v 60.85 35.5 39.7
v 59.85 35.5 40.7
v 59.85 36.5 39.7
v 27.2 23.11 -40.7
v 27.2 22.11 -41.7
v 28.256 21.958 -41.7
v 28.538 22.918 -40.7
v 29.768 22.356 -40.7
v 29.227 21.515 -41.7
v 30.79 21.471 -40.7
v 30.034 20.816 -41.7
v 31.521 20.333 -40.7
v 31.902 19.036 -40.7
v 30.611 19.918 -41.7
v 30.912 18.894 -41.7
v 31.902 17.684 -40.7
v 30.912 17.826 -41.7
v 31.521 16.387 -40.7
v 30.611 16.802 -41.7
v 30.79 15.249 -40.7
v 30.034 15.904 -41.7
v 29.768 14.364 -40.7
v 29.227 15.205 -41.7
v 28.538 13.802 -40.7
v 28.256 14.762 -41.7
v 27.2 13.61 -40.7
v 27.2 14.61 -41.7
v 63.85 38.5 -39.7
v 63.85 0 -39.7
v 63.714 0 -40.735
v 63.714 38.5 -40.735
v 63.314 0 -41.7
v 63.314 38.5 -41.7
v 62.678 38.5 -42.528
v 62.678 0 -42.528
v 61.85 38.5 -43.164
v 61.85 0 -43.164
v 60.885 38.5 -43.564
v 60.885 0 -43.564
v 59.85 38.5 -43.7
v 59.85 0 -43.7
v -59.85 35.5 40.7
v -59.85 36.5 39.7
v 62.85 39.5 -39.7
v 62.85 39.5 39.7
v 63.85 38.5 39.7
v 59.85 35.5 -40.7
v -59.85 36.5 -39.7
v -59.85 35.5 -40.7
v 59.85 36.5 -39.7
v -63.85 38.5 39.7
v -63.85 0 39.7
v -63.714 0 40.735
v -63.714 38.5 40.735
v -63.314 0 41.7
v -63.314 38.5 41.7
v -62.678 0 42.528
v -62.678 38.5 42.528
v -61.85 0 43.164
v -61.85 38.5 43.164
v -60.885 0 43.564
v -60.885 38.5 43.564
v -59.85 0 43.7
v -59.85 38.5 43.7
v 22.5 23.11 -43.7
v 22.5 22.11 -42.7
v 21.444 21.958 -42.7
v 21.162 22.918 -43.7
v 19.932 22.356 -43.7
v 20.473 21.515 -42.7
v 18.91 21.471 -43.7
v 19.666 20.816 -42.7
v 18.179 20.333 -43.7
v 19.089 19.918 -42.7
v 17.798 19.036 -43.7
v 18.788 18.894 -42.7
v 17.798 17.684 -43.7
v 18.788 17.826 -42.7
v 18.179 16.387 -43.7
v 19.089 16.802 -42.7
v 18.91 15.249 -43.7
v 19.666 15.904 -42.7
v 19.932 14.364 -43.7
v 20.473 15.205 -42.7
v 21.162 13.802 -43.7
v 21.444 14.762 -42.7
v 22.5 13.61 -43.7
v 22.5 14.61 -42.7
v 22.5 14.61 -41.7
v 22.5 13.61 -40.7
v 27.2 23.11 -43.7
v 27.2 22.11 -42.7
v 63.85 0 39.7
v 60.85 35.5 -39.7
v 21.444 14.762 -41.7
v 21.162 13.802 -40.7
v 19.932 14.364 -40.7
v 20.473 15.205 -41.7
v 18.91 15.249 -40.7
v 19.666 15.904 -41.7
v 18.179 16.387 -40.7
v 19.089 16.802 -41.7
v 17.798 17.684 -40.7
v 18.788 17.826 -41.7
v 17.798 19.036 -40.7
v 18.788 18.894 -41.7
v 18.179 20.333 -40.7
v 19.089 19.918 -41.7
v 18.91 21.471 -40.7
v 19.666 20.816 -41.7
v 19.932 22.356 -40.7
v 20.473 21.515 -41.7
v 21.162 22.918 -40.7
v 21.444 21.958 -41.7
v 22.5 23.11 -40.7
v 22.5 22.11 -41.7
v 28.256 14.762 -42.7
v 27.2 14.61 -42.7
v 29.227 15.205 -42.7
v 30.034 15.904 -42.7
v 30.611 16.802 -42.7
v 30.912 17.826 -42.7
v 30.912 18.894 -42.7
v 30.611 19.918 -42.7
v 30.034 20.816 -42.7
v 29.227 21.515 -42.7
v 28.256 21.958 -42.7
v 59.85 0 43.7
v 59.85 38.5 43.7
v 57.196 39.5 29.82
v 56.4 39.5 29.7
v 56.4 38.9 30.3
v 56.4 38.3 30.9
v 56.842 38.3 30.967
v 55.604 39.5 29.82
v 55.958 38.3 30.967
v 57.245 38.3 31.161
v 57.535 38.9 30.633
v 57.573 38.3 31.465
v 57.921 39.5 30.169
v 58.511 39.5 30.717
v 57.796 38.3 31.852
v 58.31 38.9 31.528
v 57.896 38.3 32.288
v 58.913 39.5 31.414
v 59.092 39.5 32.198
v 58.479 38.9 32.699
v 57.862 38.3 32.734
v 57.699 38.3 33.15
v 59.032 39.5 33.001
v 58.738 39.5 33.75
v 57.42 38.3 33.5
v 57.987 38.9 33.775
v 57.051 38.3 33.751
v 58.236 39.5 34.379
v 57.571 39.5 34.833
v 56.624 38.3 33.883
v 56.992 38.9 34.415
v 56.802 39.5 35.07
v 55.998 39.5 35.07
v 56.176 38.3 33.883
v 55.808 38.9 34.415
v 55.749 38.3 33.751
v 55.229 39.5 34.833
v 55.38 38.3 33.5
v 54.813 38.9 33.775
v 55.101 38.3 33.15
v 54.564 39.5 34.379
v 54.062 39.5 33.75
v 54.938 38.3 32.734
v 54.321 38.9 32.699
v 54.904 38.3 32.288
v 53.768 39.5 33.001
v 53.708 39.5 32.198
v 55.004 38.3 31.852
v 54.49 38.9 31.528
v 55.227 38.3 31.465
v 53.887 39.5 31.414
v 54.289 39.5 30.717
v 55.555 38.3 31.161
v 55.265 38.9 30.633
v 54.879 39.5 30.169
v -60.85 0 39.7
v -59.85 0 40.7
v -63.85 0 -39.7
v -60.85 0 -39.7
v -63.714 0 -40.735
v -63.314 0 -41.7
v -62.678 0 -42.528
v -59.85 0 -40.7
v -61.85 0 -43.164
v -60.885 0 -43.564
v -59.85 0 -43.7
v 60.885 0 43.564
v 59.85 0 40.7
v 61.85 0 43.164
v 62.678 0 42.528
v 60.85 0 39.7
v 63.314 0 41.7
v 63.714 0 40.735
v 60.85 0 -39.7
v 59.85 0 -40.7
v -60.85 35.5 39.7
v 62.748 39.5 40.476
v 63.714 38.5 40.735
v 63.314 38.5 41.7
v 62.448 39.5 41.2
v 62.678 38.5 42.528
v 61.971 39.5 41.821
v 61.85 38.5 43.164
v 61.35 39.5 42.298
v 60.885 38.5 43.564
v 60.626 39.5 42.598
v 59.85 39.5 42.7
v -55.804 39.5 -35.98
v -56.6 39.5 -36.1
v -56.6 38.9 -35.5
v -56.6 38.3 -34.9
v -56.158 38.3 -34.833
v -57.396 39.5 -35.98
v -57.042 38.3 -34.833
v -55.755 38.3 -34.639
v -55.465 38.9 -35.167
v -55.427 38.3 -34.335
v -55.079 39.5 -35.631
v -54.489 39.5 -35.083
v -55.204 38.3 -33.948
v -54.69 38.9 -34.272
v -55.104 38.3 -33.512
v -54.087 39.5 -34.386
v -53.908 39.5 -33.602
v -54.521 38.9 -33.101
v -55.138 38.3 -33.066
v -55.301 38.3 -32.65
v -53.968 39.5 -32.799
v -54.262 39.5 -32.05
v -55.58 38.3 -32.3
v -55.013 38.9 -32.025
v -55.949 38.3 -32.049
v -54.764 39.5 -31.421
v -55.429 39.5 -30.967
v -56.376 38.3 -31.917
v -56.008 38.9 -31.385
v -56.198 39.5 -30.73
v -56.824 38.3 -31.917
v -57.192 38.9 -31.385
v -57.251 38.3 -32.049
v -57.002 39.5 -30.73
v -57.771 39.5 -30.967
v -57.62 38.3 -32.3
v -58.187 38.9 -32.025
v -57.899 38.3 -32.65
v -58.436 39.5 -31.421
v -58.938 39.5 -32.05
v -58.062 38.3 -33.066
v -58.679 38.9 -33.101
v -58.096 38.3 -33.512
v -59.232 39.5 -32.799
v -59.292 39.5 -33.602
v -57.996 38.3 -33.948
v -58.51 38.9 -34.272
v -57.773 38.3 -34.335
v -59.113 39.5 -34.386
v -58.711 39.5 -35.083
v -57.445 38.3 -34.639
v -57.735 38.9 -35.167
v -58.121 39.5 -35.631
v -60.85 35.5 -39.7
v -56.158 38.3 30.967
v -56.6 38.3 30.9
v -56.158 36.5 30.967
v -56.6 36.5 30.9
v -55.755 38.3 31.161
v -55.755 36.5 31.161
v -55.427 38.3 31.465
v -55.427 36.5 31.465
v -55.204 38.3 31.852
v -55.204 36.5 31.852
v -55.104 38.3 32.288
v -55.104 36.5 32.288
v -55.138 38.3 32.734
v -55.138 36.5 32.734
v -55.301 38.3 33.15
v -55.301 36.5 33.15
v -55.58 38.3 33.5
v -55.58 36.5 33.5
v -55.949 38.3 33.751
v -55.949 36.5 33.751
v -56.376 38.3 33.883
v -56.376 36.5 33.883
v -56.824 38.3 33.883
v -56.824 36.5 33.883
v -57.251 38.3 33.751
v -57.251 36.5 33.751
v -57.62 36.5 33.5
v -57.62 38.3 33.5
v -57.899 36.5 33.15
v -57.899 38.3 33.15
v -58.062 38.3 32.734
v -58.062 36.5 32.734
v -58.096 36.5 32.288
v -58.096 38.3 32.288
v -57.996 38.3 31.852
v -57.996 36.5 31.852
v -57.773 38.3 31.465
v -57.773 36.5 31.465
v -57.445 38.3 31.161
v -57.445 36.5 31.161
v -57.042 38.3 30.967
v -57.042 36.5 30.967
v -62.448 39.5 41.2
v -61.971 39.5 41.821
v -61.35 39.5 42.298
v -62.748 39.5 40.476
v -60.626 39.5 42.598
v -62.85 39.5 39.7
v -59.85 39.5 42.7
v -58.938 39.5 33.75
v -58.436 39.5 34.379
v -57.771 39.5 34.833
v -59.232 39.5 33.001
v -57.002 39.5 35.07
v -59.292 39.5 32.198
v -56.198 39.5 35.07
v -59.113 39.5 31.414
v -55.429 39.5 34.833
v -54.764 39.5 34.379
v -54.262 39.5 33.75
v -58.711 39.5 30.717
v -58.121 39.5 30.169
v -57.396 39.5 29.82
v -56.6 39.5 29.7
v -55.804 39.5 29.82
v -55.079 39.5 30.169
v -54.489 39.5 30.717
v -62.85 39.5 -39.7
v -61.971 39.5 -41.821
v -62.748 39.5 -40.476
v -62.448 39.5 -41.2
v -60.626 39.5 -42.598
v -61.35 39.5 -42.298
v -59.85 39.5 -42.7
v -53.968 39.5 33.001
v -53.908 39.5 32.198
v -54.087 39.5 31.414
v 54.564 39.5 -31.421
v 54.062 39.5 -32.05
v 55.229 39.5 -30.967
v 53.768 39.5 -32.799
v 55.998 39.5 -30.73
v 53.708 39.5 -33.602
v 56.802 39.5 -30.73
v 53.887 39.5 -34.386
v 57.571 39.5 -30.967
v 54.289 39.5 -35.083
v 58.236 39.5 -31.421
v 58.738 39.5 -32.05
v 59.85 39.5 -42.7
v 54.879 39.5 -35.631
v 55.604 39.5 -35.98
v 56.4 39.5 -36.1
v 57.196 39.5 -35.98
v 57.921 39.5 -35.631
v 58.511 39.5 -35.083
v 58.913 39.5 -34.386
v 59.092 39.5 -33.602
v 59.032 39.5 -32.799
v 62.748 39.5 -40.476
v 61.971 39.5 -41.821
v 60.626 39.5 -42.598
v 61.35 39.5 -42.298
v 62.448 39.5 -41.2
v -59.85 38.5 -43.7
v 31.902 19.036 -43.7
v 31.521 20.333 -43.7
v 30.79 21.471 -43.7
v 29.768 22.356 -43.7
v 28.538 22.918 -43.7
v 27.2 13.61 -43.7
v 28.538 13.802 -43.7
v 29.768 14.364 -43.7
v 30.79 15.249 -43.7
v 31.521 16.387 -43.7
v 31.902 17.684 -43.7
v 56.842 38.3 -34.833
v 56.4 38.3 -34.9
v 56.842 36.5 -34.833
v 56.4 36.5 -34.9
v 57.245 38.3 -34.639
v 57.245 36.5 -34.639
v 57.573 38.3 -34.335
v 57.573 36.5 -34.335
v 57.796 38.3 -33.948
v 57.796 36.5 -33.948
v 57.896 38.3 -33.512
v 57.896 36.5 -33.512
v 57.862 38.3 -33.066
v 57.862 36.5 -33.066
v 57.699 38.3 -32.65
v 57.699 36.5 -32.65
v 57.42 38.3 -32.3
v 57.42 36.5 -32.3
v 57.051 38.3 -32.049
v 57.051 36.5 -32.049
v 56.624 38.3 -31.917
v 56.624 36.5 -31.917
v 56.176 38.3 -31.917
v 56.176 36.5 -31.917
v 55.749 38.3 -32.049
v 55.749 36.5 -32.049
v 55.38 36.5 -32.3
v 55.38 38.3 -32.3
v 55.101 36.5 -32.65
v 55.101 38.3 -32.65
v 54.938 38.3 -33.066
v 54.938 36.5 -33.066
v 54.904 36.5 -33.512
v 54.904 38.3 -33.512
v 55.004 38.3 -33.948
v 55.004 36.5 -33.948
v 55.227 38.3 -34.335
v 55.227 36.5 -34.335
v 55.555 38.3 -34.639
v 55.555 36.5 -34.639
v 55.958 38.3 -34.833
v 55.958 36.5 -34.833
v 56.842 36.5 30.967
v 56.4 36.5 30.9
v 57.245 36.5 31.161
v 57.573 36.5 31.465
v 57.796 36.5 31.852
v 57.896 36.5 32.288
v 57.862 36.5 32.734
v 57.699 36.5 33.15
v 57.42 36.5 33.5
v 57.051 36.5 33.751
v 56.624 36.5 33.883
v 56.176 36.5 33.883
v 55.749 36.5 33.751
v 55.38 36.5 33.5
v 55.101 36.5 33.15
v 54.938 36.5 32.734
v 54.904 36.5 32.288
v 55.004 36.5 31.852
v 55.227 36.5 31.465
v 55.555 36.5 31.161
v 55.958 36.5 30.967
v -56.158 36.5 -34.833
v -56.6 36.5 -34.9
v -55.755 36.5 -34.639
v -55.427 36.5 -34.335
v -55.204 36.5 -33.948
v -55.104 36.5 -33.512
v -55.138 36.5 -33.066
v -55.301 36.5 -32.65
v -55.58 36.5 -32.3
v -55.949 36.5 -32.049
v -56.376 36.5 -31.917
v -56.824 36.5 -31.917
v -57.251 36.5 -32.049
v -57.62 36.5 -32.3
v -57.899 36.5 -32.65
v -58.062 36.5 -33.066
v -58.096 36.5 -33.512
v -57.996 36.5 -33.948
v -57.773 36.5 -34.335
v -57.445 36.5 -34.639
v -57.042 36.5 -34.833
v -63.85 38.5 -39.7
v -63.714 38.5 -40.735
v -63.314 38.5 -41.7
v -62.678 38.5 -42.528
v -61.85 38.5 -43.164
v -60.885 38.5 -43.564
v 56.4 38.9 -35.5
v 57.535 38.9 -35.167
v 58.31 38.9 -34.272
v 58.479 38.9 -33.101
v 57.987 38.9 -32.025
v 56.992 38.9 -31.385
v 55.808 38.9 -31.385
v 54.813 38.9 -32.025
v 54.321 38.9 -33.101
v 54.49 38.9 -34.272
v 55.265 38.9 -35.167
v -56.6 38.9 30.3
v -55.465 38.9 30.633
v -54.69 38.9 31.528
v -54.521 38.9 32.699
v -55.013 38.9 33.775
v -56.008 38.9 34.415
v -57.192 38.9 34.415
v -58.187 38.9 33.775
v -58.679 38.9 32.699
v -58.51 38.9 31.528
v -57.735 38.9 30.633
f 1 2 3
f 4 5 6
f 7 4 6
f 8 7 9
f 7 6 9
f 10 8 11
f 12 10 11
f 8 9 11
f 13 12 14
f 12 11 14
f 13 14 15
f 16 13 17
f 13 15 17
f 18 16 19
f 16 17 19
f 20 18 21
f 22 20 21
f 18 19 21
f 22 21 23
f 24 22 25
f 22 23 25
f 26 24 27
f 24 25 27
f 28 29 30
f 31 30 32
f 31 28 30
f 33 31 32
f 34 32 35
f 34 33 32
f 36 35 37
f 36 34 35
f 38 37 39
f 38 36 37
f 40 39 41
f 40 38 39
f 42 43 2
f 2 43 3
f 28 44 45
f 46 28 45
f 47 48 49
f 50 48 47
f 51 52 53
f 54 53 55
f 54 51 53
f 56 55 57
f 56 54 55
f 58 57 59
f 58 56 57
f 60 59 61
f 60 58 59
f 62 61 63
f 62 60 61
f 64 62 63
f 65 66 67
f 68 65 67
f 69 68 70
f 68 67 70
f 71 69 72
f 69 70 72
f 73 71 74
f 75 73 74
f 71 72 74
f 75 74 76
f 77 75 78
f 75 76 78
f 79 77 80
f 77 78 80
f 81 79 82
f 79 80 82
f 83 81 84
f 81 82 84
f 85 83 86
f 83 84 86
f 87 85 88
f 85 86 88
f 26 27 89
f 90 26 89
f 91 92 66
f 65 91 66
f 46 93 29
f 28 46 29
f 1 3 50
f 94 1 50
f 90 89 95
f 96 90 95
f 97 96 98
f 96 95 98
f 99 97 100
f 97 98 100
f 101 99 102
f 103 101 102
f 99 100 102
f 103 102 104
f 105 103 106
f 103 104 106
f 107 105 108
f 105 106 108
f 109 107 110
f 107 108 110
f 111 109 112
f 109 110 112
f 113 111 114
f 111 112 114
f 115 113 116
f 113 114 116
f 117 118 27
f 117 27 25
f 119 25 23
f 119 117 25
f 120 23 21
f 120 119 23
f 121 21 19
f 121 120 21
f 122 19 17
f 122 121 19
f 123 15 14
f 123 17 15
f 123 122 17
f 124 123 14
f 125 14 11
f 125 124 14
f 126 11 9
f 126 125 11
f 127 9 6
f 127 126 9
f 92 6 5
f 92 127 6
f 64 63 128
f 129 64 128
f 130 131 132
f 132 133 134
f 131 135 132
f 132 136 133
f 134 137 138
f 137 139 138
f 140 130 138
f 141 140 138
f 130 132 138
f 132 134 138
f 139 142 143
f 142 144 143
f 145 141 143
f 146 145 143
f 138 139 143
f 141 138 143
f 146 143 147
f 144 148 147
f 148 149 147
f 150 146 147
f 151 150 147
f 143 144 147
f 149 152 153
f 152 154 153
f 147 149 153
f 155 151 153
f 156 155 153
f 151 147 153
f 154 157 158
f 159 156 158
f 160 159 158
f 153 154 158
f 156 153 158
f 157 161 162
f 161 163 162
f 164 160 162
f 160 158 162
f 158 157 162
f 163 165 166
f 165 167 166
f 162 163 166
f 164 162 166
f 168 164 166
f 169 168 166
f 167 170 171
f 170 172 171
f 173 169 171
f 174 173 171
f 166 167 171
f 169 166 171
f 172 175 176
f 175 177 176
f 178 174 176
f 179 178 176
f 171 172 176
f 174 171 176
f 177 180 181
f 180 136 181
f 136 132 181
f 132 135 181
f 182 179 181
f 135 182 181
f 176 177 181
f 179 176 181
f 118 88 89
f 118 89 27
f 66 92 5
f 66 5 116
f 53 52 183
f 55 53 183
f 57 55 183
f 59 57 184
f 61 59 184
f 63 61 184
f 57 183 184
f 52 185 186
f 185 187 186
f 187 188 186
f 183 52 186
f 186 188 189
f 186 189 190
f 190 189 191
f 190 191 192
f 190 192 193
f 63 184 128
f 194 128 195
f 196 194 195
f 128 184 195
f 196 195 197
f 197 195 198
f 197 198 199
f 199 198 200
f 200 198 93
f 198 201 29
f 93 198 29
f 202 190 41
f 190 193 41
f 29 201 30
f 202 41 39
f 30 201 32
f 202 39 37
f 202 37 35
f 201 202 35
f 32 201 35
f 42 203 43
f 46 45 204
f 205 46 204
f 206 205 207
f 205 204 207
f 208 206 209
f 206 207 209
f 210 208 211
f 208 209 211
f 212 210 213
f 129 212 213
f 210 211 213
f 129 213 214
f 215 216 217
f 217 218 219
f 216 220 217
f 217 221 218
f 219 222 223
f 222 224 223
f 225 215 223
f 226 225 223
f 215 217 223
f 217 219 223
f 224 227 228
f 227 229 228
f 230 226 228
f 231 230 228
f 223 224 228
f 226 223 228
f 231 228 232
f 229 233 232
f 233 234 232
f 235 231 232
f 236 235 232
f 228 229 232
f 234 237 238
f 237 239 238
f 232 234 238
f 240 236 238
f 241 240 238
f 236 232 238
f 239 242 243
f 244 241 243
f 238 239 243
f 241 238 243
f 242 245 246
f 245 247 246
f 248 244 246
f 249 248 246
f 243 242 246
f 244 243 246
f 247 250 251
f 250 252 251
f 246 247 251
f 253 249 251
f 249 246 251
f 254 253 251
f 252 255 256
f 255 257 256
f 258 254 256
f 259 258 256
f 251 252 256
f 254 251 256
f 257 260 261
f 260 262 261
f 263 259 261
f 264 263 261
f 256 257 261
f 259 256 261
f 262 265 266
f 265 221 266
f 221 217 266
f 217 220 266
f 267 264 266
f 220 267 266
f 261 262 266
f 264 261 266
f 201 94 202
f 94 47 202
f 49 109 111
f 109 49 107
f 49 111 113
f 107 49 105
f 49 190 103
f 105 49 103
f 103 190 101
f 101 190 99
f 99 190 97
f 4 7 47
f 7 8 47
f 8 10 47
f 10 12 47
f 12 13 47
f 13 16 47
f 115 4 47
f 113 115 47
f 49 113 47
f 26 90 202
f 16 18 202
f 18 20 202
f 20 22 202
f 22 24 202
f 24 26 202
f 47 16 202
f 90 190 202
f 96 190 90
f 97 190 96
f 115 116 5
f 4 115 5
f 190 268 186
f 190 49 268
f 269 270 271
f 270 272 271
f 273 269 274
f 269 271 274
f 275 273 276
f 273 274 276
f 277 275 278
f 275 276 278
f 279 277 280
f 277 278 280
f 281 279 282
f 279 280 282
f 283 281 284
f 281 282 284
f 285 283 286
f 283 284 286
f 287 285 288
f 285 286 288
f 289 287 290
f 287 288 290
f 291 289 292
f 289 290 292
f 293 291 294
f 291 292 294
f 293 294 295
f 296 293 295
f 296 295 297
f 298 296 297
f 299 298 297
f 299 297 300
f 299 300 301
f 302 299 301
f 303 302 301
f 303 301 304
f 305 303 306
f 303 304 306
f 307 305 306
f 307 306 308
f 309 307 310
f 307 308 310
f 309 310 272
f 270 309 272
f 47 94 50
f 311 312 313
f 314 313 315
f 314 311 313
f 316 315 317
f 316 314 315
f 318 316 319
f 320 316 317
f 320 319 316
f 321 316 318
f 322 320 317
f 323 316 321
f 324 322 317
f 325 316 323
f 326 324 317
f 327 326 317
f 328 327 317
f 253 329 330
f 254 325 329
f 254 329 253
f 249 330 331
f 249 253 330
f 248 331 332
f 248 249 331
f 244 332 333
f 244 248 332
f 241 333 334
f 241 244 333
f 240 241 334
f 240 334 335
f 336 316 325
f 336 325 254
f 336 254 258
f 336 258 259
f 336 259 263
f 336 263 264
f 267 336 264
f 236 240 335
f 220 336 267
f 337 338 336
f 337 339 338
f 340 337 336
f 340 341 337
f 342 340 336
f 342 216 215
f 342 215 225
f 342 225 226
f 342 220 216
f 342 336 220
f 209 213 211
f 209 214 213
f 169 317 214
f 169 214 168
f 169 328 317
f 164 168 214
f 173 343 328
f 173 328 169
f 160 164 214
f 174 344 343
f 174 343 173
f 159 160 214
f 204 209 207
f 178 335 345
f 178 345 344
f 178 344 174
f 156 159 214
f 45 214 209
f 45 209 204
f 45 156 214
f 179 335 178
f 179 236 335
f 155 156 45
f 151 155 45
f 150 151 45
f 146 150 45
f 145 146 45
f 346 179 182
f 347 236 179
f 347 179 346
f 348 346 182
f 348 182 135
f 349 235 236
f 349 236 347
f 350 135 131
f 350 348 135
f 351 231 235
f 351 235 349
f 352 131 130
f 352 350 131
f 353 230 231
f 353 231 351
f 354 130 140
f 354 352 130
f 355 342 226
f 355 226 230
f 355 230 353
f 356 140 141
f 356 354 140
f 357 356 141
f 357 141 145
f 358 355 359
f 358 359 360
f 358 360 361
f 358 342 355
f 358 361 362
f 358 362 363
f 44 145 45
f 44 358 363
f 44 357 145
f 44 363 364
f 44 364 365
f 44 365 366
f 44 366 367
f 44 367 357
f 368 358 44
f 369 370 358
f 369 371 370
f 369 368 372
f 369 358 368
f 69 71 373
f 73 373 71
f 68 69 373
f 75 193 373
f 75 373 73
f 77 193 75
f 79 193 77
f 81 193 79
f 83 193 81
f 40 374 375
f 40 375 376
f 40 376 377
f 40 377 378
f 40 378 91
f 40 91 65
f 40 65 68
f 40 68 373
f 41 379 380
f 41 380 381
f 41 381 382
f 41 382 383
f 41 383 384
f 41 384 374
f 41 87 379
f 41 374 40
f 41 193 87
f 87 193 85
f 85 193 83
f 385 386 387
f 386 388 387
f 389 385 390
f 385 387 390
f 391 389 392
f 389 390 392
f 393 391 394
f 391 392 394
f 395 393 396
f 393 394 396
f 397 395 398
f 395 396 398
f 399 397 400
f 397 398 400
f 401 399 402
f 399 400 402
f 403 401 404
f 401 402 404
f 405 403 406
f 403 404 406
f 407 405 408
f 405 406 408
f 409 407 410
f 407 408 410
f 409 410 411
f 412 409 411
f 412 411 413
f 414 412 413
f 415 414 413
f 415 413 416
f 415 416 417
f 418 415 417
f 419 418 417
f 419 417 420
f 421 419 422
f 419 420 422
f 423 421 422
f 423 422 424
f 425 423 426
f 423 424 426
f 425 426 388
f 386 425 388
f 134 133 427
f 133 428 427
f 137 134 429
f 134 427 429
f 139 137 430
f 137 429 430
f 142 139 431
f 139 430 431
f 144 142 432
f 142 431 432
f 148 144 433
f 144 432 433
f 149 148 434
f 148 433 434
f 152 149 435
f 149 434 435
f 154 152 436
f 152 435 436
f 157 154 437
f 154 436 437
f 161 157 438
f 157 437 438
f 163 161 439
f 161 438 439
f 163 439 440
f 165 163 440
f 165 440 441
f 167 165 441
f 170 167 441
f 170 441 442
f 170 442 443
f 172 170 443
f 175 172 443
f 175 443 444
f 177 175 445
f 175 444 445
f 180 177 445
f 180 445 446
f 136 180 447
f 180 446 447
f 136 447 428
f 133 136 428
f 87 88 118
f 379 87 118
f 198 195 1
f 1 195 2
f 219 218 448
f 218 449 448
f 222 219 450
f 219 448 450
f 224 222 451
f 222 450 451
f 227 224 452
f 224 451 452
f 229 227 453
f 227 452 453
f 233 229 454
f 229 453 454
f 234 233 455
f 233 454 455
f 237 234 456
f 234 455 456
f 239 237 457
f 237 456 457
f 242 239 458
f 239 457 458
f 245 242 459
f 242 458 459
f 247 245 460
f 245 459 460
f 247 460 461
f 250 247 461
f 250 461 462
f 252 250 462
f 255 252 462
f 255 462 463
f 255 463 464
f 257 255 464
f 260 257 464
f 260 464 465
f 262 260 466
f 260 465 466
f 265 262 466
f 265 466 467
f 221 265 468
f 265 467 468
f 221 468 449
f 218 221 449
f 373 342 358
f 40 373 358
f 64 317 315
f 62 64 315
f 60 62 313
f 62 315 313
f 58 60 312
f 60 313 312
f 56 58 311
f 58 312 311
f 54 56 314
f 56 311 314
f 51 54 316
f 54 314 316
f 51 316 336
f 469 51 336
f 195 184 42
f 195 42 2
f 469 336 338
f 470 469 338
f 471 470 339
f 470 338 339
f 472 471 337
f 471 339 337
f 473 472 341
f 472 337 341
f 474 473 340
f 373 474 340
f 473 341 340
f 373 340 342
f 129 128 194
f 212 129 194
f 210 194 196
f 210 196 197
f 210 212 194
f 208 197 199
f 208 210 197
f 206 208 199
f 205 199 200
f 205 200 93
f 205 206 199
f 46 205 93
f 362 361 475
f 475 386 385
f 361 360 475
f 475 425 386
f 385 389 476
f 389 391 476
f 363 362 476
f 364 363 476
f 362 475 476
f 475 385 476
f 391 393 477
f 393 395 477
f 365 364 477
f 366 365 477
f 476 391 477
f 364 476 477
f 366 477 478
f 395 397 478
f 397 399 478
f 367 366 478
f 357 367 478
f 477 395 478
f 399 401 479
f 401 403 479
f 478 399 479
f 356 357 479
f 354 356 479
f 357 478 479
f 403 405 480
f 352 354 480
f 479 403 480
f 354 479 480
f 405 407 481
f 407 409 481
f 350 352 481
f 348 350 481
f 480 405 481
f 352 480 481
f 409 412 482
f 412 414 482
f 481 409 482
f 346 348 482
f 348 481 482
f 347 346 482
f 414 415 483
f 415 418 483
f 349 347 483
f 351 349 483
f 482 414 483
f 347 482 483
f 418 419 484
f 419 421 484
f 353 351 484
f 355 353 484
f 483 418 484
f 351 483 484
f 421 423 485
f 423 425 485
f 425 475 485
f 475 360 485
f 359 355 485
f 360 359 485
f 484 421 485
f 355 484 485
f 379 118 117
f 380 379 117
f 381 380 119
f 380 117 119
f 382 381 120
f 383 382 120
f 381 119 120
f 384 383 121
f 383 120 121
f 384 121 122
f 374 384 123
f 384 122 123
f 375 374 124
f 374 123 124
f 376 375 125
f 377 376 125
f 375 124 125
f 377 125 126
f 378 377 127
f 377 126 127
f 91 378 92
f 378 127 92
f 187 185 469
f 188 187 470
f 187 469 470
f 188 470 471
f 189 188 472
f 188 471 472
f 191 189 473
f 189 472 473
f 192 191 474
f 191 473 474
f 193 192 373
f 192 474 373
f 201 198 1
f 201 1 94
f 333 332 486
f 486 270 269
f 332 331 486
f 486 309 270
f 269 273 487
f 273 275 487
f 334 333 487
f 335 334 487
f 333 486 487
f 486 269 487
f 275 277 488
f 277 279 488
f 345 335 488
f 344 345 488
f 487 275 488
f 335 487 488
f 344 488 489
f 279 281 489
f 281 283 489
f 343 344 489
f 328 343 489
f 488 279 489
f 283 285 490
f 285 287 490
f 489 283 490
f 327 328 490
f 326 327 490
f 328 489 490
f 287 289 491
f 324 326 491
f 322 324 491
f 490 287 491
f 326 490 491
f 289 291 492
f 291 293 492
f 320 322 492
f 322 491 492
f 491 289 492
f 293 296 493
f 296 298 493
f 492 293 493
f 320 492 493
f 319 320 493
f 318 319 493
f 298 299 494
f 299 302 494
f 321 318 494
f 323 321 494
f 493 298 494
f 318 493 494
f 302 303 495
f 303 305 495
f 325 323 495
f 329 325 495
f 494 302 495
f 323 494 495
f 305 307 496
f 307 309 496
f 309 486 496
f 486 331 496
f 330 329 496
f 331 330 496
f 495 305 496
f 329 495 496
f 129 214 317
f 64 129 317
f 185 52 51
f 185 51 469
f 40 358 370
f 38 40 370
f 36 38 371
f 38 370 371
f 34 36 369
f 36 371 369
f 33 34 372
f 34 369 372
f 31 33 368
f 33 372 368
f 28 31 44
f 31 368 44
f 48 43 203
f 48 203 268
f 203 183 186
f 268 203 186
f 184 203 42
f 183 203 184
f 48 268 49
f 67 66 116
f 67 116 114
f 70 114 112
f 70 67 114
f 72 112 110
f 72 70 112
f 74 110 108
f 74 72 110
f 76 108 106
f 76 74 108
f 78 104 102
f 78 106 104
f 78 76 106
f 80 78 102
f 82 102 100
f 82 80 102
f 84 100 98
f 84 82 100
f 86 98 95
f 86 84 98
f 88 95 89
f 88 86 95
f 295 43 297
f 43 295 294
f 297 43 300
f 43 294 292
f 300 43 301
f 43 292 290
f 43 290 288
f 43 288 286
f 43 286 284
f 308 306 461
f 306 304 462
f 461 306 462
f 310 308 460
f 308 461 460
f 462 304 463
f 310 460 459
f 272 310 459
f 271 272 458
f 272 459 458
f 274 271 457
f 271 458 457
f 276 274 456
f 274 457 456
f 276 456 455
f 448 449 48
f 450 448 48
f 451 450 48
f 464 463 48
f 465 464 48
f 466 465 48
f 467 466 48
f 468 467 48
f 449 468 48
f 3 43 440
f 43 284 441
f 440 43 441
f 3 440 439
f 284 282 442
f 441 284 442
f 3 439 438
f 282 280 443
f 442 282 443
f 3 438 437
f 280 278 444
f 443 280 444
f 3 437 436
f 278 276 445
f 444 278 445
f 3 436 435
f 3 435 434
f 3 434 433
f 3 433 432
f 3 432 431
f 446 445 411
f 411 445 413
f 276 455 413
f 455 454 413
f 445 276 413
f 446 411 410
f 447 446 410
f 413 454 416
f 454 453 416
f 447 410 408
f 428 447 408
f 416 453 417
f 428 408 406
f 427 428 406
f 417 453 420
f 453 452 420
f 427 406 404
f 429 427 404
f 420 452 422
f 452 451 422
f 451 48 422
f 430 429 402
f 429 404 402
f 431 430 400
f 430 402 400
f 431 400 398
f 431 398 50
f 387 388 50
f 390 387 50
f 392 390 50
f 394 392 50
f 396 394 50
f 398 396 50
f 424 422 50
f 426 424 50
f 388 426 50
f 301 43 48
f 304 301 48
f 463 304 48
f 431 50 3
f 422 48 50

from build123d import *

# Parameters (mm, degrees)
SKETCH1_W                                       = 127.7
SKETCH1_H                                       = 87.4
BOSS_EXTRUDE1_DEPTH                             = 39.5
SHELL1_T                                        = -3
FILLET2_R                                       = 4
CSK_FOR_M2_FLAT_HEAD_MACHINE_SCREW3_D           = 3
CSK_FOR_M2_FLAT_HEAD_MACHINE_SCREW3_CSINK_D     = 5.4
CSK_FOR_M2_FLAT_HEAD_MACHINE_SCREW3_CSINK_ANGLE = 90
CUT_EXTRUDE1_REACH                              = 89.4
CHAMFER1_SIZE                                   = 1
CHAMFER2_SIZE                                   = 1
CHAMFER3_SIZE                                   = 1


with BuildPart() as part:
    # Sketch1 → Boss-Extrude1 (new body)
    with BuildSketch(Plane(origin=(0, 0, 0), x_dir=(1, 0, 0), z_dir=(0, 1, 0))):
        Rectangle(SKETCH1_W, SKETCH1_H)
    extrude(amount=BOSS_EXTRUDE1_DEPTH)

    # Shell1
    shell1_openings = [part.faces().sort_by_distance(p)[0] for p in [
        (0, 0, 0),
    ]]
    offset(amount=SHELL1_T, openings=shell1_openings, kind=Kind.INTERSECTION)

    # Fillet2
    fillet2_edges = [part.edges().sort_by_distance(p)[0] for p in [
        (-63.85, 19.75, -43.7),
        (63.85, 19.75, -43.7),
        (63.85, 19.75, 43.7),
        (-63.85, 19.75, 43.7),
    ]]
    fillet(fillet2_edges, radius=FILLET2_R)

    # CSK for M2 Flat Head Machine Screw3 (through all)
    with Locations(Plane(origin=(56.4, 39.5, -33.4), x_dir=(0, 0, 1), z_dir=(0, 1, 0))):
        with Locations((0, 0), (0, -113), (65.8, -113), (65.8, 0)):
            CounterSinkHole(CSK_FOR_M2_FLAT_HEAD_MACHINE_SCREW3_D / 2, CSK_FOR_M2_FLAT_HEAD_MACHINE_SCREW3_CSINK_D / 2, counter_sink_angle=CSK_FOR_M2_FLAT_HEAD_MACHINE_SCREW3_CSINK_ANGLE)

    # Sketch9 → Cut-Extrude1 (cut, up to next)
    with BuildSketch(Plane(origin=(0, 0, -43.7), x_dir=(-1, 0, 0), z_dir=(0, 0, -1)), mode=Mode.PRIVATE) as cut_extrude1_sk1:
        with BuildLine():
            Line((-27.2, 22.11), (-22.5, 22.11))
            ThreePointArc((-22.5, 22.11), (-18.75, 18.36), (-22.5, 14.61))
            Line((-22.5, 14.61), (-27.2, 14.61))
            ThreePointArc((-27.2, 14.61), (-30.95, 18.36), (-27.2, 22.11))
        make_face()
    cut_extrude1_tool1 = extrude(cut_extrude1_sk1.sketch, amount=-CUT_EXTRUDE1_REACH, mode=Mode.PRIVATE) & part.part
    add(cut_extrude1_tool1.solids().sort_by_distance((24.85, 18.36, -43.7))[0], mode=Mode.SUBTRACT)

    # Chamfer1
    chamfer1_edges = [part.edges().sort_by_distance(p)[0] for p in [
        (30.95, 18.36, -43.7),
        (24.85, 14.61, -43.7),
        (18.75, 18.36, -43.7),
        (24.85, 22.11, -43.7),
        (24.85, 14.61, -40.7),
        (18.75, 18.36, -40.7),
        (24.85, 22.11, -40.7),
        (30.95, 18.36, -40.7),
    ]]
    chamfer(chamfer1_edges, length=CHAMFER1_SIZE)

    # Chamfer2
    chamfer2_edges = [part.edges().sort_by_distance(p)[0] for p in [
        (0, 39.5, -43.7),
        (63.85, 39.5, 0),
        (-63.85, 39.5, 0),
        (0, 39.5, 43.7),
        (62.678427125, 39.5, 42.528427125),
        (-62.678427125, 39.5, 42.528427125),
        (-62.678427125, 39.5, -42.528427125),
        (62.678427125, 39.5, -42.528427125),
    ]]
    chamfer(chamfer2_edges, length=CHAMFER2_SIZE)

    # Chamfer3
    chamfer3_edges = [part.edges().sort_by_distance(p)[0] for p in [
        (-60.85, 18.25, -40.7),
        (-60.85, 18.25, 40.7),
        (60.85, 18.25, 40.7),
        (60.85, 18.25, -40.7),
        (-60.85, 36.5, 0),
        (0, 36.5, 40.7),
        (60.85, 36.5, 0),
        (0, 36.5, -40.7),
    ]]
    chamfer(chamfer3_edges, length=CHAMFER3_SIZE)


solid = part.part
